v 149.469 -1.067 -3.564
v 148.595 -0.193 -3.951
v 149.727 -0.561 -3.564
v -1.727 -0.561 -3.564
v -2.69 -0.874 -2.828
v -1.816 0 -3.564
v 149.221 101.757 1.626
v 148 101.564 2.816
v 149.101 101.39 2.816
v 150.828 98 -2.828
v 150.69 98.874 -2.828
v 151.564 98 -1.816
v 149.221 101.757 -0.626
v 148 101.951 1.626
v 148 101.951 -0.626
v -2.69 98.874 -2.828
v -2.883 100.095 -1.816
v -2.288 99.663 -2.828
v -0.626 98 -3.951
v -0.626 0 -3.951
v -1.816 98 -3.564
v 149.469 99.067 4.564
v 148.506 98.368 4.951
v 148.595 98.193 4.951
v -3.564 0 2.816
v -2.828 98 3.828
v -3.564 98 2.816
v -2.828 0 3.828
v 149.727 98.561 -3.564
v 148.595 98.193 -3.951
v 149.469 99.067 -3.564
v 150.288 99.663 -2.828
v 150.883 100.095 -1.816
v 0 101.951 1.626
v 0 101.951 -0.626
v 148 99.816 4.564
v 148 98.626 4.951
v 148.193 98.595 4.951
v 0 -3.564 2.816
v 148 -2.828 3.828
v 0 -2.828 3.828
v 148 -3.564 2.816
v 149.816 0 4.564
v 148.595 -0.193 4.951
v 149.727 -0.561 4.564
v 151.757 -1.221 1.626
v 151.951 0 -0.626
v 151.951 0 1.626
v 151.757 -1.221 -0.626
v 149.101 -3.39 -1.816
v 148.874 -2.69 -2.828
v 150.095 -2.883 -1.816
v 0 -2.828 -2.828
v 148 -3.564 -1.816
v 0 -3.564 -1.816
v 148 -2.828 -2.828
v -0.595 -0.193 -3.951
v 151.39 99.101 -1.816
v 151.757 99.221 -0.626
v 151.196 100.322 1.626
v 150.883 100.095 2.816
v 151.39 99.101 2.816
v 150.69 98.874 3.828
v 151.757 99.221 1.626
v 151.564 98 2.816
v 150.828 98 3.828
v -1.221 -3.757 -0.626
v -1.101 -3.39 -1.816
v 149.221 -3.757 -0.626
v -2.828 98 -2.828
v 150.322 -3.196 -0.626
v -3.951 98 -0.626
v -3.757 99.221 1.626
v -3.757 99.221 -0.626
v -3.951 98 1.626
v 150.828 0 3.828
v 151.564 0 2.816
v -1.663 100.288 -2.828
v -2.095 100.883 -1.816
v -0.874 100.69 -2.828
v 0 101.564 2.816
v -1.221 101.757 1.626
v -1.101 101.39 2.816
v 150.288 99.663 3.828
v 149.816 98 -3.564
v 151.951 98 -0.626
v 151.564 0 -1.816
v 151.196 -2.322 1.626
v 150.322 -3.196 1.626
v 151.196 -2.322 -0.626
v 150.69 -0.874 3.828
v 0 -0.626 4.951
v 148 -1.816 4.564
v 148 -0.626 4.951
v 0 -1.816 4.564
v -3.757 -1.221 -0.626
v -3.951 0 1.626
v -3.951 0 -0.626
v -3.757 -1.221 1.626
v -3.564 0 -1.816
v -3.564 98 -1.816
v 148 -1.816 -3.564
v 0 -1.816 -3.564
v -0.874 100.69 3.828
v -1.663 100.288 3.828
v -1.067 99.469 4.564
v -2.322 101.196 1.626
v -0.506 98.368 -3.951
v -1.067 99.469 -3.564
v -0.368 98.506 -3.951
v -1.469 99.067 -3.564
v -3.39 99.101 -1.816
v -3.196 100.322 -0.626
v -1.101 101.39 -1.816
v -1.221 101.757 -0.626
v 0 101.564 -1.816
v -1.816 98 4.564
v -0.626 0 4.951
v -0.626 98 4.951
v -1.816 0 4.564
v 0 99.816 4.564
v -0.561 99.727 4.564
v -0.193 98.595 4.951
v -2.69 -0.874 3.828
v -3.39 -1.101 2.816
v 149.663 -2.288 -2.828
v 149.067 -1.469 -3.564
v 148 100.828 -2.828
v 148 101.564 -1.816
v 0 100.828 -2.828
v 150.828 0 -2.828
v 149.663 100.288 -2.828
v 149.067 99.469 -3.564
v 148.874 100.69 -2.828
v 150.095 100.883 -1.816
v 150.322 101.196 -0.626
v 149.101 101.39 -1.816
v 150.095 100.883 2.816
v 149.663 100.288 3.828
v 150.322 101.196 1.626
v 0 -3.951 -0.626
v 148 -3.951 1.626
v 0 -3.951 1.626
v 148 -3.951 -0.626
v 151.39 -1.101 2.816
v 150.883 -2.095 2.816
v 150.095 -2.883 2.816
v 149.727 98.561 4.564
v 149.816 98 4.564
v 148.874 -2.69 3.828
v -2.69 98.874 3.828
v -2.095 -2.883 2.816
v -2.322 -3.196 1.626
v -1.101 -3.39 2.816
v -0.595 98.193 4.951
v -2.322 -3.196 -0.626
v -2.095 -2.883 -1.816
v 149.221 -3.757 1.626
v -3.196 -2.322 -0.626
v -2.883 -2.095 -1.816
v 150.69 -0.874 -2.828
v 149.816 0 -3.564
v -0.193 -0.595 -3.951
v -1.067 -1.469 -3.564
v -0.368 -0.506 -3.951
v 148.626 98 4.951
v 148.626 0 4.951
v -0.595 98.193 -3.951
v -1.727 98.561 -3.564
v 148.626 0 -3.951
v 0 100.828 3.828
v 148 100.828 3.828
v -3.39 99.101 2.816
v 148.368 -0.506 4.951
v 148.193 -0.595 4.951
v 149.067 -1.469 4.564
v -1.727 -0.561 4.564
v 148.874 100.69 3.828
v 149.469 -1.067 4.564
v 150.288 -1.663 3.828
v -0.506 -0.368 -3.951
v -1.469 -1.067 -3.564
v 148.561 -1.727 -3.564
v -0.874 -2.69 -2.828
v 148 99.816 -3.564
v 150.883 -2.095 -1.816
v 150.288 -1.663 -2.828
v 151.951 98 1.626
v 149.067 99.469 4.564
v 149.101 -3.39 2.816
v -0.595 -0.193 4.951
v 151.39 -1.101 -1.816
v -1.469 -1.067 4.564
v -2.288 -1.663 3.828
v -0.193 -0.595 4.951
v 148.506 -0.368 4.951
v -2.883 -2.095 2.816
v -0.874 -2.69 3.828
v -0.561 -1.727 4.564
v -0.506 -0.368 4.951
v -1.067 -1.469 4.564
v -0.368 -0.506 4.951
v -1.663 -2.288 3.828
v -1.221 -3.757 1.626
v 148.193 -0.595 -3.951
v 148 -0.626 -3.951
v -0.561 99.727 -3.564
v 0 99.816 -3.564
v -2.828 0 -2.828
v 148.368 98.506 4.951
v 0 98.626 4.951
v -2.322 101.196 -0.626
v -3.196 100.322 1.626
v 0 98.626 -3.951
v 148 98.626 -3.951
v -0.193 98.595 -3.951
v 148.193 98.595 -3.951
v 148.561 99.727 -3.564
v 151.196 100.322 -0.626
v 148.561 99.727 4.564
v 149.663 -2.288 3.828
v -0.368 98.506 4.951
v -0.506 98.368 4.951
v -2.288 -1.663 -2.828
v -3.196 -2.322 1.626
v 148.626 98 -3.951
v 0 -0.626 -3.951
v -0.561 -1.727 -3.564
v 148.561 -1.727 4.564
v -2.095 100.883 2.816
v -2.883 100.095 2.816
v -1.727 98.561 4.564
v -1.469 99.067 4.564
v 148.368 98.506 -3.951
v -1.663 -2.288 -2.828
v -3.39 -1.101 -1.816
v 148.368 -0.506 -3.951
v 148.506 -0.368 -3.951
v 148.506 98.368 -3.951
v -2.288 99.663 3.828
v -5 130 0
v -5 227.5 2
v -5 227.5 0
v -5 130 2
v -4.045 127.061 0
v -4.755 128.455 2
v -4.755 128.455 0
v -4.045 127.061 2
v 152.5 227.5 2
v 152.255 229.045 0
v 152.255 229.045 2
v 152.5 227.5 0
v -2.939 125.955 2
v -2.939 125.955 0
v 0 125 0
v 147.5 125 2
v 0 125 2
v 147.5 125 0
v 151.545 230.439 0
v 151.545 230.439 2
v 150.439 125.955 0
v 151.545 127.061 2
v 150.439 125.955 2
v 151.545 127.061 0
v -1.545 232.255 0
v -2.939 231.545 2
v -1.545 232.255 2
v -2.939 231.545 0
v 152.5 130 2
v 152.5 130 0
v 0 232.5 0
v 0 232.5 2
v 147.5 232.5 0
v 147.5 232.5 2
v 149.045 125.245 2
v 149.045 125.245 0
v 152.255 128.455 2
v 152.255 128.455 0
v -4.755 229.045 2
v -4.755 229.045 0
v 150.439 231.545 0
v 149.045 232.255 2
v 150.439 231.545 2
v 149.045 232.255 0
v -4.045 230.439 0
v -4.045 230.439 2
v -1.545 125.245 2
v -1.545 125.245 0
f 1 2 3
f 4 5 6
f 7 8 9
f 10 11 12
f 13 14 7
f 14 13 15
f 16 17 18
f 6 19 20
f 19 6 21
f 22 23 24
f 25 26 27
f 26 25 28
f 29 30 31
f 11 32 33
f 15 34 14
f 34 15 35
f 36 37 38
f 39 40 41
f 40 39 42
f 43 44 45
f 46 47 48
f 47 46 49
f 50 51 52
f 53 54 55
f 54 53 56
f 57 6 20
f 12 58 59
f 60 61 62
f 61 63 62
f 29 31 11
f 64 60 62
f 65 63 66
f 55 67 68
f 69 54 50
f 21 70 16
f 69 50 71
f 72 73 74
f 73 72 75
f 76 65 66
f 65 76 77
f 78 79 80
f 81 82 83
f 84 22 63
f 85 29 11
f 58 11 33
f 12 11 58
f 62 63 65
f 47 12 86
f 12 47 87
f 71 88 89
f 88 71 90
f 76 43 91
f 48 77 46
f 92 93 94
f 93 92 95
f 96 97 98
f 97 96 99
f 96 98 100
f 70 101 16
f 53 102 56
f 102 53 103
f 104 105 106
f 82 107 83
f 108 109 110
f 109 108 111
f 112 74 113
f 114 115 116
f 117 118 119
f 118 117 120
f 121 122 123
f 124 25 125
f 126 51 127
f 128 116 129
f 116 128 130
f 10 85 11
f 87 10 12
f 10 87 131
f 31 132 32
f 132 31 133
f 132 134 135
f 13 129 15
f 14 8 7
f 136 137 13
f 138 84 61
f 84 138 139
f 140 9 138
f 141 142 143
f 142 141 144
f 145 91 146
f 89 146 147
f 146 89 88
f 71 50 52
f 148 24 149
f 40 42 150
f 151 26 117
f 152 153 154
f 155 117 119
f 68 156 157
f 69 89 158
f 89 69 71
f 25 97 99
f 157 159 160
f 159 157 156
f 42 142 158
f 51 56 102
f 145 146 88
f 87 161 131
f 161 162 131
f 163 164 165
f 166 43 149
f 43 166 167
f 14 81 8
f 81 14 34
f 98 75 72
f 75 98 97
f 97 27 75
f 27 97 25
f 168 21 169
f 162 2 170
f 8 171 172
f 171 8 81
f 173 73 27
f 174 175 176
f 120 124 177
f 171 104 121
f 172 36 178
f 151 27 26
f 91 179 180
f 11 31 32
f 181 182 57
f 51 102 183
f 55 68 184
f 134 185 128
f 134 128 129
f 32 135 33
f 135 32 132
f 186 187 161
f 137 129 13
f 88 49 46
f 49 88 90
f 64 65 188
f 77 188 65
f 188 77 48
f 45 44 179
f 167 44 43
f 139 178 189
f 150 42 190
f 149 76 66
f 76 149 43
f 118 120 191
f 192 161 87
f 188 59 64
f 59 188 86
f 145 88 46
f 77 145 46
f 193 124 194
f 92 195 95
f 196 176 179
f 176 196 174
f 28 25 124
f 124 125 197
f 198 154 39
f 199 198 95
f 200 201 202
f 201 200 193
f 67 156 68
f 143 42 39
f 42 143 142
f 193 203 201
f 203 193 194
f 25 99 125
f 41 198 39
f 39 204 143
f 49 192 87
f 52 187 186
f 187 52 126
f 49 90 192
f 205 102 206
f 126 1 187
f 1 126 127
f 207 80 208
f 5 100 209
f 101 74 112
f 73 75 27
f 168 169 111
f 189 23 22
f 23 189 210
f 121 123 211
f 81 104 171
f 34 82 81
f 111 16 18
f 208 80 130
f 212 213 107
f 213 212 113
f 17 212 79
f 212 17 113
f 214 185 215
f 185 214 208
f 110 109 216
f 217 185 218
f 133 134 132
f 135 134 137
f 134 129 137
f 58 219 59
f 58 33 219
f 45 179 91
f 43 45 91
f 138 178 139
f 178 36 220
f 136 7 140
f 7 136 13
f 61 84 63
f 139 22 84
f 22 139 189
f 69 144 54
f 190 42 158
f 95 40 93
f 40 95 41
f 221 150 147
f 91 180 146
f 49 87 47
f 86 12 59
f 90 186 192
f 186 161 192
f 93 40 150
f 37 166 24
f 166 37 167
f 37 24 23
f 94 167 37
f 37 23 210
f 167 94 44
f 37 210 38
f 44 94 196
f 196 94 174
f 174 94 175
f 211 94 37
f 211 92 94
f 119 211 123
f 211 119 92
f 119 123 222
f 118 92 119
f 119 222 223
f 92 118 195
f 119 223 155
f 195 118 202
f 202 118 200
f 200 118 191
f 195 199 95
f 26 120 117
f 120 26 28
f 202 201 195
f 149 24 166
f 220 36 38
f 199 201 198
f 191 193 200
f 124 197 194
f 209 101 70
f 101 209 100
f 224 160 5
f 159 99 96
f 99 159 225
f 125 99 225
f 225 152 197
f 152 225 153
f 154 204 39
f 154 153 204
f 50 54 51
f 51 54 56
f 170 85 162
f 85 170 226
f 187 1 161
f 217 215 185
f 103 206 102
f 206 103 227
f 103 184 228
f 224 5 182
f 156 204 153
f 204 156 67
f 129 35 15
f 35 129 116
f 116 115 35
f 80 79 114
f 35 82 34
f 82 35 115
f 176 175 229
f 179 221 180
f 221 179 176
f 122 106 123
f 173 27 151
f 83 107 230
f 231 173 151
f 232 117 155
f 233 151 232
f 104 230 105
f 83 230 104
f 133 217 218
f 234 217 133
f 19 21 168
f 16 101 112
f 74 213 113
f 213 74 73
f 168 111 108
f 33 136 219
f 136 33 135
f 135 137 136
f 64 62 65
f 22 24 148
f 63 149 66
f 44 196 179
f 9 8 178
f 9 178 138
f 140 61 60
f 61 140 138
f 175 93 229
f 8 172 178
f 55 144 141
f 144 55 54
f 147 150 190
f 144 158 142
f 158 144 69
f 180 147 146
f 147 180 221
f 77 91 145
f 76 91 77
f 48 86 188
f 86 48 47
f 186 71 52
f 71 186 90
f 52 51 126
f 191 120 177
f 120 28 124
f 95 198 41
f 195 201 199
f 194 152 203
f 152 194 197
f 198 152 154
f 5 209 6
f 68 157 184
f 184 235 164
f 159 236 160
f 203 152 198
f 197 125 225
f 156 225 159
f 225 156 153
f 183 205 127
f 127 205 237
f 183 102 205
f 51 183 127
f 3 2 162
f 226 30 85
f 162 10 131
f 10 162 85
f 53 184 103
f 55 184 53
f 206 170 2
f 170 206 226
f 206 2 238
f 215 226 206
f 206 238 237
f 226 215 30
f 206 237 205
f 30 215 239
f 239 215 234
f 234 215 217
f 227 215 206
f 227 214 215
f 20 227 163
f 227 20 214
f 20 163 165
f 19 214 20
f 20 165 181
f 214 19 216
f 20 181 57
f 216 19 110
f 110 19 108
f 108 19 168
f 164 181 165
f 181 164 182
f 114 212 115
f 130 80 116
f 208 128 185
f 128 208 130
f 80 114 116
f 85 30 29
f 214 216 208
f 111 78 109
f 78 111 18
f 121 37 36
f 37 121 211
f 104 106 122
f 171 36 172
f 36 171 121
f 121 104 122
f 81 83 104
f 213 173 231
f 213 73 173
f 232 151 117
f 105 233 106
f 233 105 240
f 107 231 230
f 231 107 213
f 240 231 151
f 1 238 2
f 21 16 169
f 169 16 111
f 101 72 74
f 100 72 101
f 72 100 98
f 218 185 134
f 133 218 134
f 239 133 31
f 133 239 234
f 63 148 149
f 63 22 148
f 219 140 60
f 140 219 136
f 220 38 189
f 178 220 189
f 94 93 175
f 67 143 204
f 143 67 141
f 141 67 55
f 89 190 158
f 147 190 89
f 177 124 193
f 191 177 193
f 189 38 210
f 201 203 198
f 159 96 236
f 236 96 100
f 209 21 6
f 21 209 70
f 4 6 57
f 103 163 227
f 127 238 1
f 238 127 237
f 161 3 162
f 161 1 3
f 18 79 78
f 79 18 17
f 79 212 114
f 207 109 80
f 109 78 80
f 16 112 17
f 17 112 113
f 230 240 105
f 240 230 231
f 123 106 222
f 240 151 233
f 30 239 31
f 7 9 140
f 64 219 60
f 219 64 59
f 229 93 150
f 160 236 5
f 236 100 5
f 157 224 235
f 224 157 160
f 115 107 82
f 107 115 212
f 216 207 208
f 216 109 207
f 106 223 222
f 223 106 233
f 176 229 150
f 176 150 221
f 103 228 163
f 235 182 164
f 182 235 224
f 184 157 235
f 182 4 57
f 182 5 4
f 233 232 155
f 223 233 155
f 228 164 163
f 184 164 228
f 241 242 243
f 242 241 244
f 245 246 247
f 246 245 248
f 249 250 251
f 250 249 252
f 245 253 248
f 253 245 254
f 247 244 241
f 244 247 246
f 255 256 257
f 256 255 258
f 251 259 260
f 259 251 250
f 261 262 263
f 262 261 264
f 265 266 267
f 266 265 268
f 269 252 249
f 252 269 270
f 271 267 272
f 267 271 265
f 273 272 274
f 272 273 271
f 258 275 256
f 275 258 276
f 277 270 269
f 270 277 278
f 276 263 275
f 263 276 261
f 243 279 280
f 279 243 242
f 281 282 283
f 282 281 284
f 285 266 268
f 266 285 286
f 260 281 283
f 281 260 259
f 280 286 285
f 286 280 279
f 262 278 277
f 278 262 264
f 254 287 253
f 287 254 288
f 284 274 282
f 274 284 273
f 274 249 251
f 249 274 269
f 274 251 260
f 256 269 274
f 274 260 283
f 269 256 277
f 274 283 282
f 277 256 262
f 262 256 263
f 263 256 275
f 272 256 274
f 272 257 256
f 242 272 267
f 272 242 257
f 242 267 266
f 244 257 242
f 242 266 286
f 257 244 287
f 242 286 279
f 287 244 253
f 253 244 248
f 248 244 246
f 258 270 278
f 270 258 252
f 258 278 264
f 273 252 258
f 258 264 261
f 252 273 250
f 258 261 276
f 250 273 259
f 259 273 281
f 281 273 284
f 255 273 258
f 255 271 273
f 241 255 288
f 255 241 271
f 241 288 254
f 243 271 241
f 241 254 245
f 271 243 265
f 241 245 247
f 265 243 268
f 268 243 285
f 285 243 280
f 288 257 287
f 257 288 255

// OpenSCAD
// file: ../../rounded-cube.scad
/**
 *
 *  some parts of this software were inspired by
 *
 * 	     http://www.thingiverse.com/thing:9347
 *
 */

/**
 * makes a rounded cube
 */
module roundedCube(cornerRadius=4,
				   cubeCentered=false,
				   sides=30,
				   sidesOnly=false,
				   size=[20,20,2])
{
    $fn=sides;

    x = size[0] - cornerRadius/2;
    y = size[1] - cornerRadius/2;
    z = size[2];

    minkowski()
    {
        cube(size=[x,y,z], center=cubeCentered);

        if(sidesOnly)
        {
            cylinder(r=cornerRadius);
        }
        else
        {
            sphere(r=cornerRadius);
        }
    };
}
// main file
use <../../rounded-cube.scad>

boardLength = 150;
boardWidth = 100;
size = [boardLength, boardWidth, 1];

roundedCube(size=[boardLength, boardWidth, 1],
            sides=5,
            sides=20);

translate([0, 130, 0])
roundedCube(cornerRadius = 5,
            sides=20,
            sidesOnly=true,
            size=size);
